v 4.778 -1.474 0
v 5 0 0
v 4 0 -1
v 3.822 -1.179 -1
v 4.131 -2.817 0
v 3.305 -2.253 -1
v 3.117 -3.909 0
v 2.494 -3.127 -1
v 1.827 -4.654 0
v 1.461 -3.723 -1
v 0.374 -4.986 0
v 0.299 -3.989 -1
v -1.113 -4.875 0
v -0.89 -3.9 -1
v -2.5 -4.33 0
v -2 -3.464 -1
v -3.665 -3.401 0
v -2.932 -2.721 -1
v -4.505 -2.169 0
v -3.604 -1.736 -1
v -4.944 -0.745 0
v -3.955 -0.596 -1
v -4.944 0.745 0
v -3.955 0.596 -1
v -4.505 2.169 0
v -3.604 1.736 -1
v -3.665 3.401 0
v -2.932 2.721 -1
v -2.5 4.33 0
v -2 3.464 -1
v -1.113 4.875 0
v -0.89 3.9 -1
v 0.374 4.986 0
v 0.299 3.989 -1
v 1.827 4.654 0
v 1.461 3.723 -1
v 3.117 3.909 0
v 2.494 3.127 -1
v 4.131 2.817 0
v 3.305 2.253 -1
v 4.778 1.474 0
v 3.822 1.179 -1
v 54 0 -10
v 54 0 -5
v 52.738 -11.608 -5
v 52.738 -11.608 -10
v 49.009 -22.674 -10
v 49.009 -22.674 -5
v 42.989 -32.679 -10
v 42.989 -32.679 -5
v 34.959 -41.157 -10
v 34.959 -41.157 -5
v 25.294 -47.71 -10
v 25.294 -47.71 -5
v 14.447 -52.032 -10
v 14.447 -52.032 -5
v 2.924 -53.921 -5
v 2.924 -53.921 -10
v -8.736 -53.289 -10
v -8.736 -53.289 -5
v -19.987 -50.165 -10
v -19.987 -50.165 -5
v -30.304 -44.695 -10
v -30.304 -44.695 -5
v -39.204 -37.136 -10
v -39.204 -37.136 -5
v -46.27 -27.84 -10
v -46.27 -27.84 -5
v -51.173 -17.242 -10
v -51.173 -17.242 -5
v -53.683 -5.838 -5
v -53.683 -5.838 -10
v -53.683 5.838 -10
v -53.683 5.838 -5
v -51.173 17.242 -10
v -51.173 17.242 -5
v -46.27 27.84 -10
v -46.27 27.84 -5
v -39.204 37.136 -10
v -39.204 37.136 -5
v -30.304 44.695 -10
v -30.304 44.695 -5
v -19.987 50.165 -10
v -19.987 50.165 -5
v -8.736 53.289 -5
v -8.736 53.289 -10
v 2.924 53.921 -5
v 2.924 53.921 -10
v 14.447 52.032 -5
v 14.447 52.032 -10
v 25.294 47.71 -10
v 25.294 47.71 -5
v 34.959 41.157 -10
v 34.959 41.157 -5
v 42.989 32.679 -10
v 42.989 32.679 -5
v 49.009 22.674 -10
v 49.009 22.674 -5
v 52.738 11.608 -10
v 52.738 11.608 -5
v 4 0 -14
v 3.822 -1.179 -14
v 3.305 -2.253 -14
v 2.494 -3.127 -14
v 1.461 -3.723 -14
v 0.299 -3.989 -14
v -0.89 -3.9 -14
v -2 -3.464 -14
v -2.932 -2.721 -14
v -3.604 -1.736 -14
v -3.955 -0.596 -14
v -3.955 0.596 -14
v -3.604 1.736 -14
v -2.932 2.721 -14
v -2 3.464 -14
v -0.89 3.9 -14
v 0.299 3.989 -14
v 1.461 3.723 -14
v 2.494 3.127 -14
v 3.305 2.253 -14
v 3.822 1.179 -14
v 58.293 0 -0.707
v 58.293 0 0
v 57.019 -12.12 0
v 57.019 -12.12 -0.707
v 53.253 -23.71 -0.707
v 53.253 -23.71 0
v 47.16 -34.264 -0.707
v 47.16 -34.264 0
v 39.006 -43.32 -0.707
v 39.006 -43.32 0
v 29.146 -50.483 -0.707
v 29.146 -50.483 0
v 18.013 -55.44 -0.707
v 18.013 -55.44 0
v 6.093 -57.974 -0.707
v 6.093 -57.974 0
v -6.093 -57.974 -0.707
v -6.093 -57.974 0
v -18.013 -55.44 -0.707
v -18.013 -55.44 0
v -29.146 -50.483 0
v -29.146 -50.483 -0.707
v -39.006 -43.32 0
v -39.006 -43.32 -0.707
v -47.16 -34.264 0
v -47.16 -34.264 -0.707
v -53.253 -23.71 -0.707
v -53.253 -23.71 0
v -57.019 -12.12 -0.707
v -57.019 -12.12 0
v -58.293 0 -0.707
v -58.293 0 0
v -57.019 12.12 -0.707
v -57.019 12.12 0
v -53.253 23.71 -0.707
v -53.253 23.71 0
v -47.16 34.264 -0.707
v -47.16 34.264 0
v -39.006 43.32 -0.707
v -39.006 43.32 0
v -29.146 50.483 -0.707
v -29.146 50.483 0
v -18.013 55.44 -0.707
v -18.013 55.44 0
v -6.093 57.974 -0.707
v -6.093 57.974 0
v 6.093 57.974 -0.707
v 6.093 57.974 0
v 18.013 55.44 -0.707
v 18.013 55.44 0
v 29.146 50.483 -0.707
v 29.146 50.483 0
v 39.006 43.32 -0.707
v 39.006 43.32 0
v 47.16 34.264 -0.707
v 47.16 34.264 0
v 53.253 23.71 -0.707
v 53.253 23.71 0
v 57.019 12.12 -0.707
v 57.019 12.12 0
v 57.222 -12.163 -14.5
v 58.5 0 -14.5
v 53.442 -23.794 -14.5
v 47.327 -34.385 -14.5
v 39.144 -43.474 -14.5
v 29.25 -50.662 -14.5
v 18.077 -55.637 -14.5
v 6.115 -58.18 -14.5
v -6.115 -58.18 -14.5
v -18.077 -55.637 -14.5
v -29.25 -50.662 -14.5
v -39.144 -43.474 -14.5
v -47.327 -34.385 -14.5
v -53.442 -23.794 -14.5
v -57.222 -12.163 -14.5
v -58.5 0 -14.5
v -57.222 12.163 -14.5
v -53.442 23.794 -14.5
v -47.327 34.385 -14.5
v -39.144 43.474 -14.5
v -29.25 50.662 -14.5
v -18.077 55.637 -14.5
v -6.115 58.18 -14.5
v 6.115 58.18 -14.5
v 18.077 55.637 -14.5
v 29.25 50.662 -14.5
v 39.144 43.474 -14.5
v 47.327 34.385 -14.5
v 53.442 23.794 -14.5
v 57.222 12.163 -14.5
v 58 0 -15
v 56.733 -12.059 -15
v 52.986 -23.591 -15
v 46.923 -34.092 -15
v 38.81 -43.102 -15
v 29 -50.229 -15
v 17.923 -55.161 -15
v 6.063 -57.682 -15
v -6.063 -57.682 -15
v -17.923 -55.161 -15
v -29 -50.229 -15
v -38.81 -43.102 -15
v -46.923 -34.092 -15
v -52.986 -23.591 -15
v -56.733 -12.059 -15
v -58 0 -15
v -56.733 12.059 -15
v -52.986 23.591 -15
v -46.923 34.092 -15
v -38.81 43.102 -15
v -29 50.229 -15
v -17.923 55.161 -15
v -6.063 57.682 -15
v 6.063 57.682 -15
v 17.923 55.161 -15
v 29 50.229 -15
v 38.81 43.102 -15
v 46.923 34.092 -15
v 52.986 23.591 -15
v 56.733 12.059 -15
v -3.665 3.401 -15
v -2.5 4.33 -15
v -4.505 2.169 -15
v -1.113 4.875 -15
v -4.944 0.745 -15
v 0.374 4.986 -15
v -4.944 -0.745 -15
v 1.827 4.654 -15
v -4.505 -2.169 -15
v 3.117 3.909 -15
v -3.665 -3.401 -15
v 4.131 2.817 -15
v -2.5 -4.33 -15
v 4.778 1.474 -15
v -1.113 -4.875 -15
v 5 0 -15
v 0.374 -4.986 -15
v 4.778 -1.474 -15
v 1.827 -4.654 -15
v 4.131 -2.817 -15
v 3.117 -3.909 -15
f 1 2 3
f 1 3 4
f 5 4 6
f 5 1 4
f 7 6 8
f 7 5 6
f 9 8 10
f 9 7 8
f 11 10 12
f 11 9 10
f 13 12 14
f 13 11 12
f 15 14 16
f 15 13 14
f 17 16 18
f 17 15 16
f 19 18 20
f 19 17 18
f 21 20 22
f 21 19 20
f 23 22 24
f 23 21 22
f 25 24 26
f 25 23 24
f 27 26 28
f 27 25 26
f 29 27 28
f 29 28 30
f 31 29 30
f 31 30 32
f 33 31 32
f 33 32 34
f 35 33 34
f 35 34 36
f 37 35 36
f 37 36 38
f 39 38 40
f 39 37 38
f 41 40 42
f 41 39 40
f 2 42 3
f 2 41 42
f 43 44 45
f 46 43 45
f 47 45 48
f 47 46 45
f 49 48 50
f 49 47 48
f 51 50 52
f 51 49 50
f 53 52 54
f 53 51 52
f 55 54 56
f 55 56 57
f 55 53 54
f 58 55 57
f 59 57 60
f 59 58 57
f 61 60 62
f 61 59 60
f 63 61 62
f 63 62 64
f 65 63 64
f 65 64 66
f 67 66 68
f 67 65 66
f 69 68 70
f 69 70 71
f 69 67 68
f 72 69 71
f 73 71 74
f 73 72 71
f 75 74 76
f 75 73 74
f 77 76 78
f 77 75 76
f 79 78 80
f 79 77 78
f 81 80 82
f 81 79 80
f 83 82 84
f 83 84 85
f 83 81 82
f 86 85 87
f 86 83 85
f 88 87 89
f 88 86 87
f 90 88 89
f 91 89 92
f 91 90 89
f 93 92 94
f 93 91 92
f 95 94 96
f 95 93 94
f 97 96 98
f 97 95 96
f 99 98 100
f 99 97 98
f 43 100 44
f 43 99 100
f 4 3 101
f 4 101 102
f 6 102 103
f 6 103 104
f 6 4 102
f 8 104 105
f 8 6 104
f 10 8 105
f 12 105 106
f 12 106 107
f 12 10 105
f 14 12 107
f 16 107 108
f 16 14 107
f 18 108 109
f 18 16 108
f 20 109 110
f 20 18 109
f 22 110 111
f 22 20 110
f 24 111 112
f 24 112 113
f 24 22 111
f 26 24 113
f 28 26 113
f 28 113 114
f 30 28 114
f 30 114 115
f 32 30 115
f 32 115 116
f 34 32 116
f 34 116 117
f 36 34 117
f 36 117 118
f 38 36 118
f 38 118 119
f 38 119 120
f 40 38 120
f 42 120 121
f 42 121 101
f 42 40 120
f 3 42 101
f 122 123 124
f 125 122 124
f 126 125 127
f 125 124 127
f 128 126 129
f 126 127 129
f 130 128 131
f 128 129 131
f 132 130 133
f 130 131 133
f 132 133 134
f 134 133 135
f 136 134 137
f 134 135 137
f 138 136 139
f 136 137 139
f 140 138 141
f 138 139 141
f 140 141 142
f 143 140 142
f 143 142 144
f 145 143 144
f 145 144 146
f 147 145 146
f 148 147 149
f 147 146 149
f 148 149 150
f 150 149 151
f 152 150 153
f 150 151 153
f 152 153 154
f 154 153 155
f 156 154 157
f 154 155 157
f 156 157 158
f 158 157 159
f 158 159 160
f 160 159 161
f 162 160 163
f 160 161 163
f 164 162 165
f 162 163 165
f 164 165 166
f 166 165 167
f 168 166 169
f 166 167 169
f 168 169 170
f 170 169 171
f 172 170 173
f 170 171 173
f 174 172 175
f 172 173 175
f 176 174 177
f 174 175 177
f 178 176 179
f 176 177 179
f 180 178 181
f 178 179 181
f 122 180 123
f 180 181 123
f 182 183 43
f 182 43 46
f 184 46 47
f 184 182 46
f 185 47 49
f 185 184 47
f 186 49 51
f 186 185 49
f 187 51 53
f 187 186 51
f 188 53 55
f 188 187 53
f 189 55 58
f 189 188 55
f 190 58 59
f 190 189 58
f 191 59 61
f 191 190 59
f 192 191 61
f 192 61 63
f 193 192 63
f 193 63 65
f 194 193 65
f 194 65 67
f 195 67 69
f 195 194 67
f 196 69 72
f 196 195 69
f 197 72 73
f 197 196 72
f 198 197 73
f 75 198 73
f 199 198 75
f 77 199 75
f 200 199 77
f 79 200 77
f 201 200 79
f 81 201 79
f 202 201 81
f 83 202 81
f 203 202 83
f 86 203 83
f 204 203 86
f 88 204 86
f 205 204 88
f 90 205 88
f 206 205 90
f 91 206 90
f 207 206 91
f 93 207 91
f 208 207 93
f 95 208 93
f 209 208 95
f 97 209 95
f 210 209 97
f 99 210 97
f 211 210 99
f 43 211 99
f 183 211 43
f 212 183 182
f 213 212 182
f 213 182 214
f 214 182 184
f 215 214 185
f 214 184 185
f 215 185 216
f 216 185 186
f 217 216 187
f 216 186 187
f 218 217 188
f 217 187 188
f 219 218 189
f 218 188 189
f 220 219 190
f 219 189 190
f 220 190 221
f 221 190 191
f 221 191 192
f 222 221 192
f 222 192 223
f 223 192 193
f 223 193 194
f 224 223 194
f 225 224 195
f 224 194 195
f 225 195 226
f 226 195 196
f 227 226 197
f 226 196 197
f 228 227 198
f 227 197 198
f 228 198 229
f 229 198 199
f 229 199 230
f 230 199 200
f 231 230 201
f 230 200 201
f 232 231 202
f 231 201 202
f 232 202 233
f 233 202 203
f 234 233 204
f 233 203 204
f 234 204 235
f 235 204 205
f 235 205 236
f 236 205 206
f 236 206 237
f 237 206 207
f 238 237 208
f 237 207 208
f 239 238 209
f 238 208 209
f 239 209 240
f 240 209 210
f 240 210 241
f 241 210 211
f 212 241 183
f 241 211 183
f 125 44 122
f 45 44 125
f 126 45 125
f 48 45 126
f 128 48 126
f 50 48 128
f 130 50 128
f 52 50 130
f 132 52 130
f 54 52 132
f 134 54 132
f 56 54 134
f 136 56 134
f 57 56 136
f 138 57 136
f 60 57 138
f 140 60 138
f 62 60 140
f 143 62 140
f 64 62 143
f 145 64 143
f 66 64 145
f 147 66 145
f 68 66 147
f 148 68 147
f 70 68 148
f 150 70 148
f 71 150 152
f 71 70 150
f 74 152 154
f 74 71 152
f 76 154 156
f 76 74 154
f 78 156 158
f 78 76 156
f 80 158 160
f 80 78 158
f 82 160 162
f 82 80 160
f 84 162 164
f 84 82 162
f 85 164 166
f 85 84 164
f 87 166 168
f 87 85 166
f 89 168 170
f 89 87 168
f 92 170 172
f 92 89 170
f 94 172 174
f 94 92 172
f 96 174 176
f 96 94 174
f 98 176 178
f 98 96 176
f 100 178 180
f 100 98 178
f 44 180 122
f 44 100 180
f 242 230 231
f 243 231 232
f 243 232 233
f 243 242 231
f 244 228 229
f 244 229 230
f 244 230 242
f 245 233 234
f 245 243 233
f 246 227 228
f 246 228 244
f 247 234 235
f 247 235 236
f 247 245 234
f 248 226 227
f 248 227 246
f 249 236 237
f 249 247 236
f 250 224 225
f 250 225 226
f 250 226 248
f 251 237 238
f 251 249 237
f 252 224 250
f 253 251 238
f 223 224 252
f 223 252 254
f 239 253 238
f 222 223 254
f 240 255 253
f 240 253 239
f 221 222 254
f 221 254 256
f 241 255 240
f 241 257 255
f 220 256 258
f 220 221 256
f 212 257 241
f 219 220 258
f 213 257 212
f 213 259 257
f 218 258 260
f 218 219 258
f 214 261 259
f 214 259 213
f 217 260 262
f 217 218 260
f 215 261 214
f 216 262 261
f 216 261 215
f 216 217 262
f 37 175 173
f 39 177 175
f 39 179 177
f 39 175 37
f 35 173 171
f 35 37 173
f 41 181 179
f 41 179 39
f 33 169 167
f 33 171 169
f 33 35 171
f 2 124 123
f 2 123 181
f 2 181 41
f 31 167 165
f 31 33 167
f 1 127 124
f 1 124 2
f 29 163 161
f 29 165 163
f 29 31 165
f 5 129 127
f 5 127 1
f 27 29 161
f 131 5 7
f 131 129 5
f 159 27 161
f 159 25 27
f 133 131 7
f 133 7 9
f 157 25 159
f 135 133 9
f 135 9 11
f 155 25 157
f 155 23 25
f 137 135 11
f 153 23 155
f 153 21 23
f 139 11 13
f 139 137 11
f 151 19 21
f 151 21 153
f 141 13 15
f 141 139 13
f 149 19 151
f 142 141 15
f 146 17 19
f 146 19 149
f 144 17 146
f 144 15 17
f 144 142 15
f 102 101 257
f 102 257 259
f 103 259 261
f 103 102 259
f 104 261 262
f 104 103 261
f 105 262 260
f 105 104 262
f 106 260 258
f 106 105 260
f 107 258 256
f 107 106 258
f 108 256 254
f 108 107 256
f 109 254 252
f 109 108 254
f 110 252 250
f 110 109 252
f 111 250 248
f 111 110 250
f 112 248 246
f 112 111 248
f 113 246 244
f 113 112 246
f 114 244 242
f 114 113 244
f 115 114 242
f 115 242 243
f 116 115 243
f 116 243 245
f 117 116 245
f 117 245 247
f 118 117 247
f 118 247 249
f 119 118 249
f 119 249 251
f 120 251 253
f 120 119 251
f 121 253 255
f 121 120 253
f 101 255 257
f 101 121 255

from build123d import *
from OCP.BRepFilletAPI import BRepFilletAPI_MakeChamfer

# Parameters (mm, degrees)
CHAMFER1_SIZE  = 1
CHAMFER1_SIZE2 = 0.707106781


with BuildPart() as part:
    # Sketch1 → Revolve1 (revolve)
    with BuildSketch(Plane(origin=(0, 0, 0), x_dir=(1, 0, 0), z_dir=(0, 1, 0))):
        Polygon((59, 0), (54, 5), (54, 10), (59, 15), (4, 15), (4, 0), align=None)
    revolve(axis=Axis((0, 0, 0), (0, 0, -1)))

    # Chamfer1: one chamfer whose edges measure the first distance from different faces: ONE call of the kernel's chamfer builder (chamfer() names one face for all edges)
    chamfer1_edges_1 = [part.edges().sort_by_distance(p)[0] for p in [
        (-4, 0, 0),
        (-4, 0, -15),
    ]]
    chamfer1_edges_2 = [part.edges().sort_by_distance(p)[0] for p in [
        (-59, 0, 0),
    ]]
    chamfer1_side_2 = [part.faces().sort_by_distance(p)[0] for p in [
        (-56.5, 0, -2.5),
    ]]
    chamfer1_edges_3 = [part.edges().sort_by_distance(p)[0] for p in [
        (-59, 0, -15),
    ]]
    chamfer1_side_3 = [part.faces().sort_by_distance(p)[0] for p in [
        (-57.331227996, 0, -15),
    ]]
    chamfer1 = BRepFilletAPI_MakeChamfer(part.part.solid().wrapped)
    for e in chamfer1_edges_1:
        chamfer1.Add(CHAMFER1_SIZE, e.wrapped)
    for e in chamfer1_edges_2:
        chamfer1.Add(CHAMFER1_SIZE, CHAMFER1_SIZE2, e.wrapped, chamfer1_side_2[0].wrapped)  # the first distance lies on this face
    for e in chamfer1_edges_3:
        chamfer1.Add(CHAMFER1_SIZE, CHAMFER1_SIZE2, e.wrapped, chamfer1_side_3[0].wrapped)  # the first distance lies on this face
    add(Compound.cast(chamfer1.Shape()), mode=Mode.REPLACE)


solid = part.part
